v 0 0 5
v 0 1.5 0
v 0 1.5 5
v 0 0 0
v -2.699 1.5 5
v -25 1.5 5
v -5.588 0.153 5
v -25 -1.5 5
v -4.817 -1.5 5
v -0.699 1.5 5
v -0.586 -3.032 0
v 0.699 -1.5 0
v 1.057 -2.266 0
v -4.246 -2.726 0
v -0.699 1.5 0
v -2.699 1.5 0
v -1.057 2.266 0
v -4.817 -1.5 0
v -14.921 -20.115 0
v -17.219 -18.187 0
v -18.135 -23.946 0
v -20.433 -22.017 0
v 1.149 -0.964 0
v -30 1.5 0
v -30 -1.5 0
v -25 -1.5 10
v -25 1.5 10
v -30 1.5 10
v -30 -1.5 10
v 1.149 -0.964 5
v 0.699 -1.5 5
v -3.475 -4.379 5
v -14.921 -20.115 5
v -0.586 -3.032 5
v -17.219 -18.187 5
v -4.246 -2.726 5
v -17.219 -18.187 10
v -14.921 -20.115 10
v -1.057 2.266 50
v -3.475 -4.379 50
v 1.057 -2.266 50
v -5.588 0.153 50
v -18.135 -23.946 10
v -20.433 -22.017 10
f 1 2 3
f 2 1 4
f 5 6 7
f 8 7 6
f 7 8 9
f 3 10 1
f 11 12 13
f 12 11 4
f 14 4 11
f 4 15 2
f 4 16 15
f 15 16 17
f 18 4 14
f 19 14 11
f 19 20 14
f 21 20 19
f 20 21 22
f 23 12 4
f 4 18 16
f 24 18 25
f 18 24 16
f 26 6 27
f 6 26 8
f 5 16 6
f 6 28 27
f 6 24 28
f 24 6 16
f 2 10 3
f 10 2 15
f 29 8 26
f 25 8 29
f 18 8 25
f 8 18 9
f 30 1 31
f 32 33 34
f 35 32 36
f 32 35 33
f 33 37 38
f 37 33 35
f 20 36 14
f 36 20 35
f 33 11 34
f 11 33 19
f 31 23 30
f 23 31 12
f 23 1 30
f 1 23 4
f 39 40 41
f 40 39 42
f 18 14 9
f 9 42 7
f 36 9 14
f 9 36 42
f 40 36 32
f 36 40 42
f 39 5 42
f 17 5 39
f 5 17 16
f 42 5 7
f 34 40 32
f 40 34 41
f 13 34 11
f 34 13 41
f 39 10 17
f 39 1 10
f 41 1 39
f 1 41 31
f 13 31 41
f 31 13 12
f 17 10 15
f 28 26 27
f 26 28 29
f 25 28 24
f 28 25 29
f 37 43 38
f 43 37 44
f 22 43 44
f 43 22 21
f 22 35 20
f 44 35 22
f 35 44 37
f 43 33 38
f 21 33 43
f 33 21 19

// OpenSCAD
// Created by: Kopp3D   
// Link: https://makerworld.com/en/@Kopp3D 
// License: CC-Attribution-Noncommercial-Share Alike
//------------------
//------------------
// Variables for backing
Backing_height = 50;
Backing_width = 5;
Backing_length = 5; 
// Use this when you increase or decrease the angle between stand legs to match
Backing_rotation_angle = 25; 


// Variables for left leg 
Left_leg_height = 5;
Left_leg_width = 3;
Left_leg_length = 25;
//------------------
// Variables for right leg
Right_leg_height = 5;
Right_leg_width = 3;
Right_leg_length = 25;  

//------------------ 
// Variable for the angle between stand legs
Angle_between_legs = 50;

// Variables for the endcaps

Left_endcap_height = 10;
Left_endcap_length = 5;
Left_endcap_width = 3;

Right_endcap_height = 10;
Right_endcap_length = 5;
Right_endcap_width = 3;
// Use this to move endcaps in tandem to match length of the legs
Endcap_radius = 50;
// Just there to make sure everything is generated property 
Starting_stand_height = 25; 


module stand(stand_r, stand_h, red_h, red_w, red_l, blue_h, blue_w, blue_l, backing_h, backing_w, backing_l, angle_btwn, backing_a, red_sq_h, red_sq_l, red_sq_w, blue_sq_h, blue_sq_l, blue_sq_w){
    // Base of the stand (uncomment if needed)
    // translate([0, 0, -1]) cylinder(r=stand_r + 1, h=1);

    // Outer boundary of the stand (commented out)
    // difference(){
    //     cylinder(r=stand_r + 1, h=stand_h, center=true);
    //     cylinder(r=stand_r, h=stand_h, center=true);
    // }

    // Stand legs
    translate([-(red_l / 2), 0, red_h / 2]) color("red") cube([red_l, red_w, red_h], center=true);
    rotate([0, 0, angle_btwn]) translate([-(blue_l / 2), 0, blue_h / 2]) color("blue") cube([blue_l, blue_w, blue_h], center=true);
    rotate([0, 0, backing_a]) translate([-(backing_l / 2), 0, backing_h / 2]) color("green") cube([backing_l, backing_w, backing_h], center=true); // backing rotates in place

    // Squares at the outer faces of red and blue legs, starting at Y=0
    translate([-(stand_r / 2 + red_sq_l / 2), 0, red_sq_h / 2]) color("yellow") cube([red_sq_l, red_sq_w, red_sq_h], center=true);
    rotate([0, 0, angle_btwn]) translate([-(stand_r / 2 + blue_sq_l / 2), 0, blue_sq_h / 2]) color("cyan") cube([blue_sq_l, blue_sq_w, blue_sq_h], center=true);
}

// Call the stand module with variables
stand(Endcap_radius, Starting_stand_height, Left_leg_height, Left_leg_width, Left_leg_length, Right_leg_height, Right_leg_width, Right_leg_length, Backing_height, Backing_width, Backing_length, Angle_between_legs, Backing_rotation_angle, Left_endcap_height, Left_endcap_length, Left_endcap_width, Right_endcap_height, Right_endcap_length, Right_endcap_width);
